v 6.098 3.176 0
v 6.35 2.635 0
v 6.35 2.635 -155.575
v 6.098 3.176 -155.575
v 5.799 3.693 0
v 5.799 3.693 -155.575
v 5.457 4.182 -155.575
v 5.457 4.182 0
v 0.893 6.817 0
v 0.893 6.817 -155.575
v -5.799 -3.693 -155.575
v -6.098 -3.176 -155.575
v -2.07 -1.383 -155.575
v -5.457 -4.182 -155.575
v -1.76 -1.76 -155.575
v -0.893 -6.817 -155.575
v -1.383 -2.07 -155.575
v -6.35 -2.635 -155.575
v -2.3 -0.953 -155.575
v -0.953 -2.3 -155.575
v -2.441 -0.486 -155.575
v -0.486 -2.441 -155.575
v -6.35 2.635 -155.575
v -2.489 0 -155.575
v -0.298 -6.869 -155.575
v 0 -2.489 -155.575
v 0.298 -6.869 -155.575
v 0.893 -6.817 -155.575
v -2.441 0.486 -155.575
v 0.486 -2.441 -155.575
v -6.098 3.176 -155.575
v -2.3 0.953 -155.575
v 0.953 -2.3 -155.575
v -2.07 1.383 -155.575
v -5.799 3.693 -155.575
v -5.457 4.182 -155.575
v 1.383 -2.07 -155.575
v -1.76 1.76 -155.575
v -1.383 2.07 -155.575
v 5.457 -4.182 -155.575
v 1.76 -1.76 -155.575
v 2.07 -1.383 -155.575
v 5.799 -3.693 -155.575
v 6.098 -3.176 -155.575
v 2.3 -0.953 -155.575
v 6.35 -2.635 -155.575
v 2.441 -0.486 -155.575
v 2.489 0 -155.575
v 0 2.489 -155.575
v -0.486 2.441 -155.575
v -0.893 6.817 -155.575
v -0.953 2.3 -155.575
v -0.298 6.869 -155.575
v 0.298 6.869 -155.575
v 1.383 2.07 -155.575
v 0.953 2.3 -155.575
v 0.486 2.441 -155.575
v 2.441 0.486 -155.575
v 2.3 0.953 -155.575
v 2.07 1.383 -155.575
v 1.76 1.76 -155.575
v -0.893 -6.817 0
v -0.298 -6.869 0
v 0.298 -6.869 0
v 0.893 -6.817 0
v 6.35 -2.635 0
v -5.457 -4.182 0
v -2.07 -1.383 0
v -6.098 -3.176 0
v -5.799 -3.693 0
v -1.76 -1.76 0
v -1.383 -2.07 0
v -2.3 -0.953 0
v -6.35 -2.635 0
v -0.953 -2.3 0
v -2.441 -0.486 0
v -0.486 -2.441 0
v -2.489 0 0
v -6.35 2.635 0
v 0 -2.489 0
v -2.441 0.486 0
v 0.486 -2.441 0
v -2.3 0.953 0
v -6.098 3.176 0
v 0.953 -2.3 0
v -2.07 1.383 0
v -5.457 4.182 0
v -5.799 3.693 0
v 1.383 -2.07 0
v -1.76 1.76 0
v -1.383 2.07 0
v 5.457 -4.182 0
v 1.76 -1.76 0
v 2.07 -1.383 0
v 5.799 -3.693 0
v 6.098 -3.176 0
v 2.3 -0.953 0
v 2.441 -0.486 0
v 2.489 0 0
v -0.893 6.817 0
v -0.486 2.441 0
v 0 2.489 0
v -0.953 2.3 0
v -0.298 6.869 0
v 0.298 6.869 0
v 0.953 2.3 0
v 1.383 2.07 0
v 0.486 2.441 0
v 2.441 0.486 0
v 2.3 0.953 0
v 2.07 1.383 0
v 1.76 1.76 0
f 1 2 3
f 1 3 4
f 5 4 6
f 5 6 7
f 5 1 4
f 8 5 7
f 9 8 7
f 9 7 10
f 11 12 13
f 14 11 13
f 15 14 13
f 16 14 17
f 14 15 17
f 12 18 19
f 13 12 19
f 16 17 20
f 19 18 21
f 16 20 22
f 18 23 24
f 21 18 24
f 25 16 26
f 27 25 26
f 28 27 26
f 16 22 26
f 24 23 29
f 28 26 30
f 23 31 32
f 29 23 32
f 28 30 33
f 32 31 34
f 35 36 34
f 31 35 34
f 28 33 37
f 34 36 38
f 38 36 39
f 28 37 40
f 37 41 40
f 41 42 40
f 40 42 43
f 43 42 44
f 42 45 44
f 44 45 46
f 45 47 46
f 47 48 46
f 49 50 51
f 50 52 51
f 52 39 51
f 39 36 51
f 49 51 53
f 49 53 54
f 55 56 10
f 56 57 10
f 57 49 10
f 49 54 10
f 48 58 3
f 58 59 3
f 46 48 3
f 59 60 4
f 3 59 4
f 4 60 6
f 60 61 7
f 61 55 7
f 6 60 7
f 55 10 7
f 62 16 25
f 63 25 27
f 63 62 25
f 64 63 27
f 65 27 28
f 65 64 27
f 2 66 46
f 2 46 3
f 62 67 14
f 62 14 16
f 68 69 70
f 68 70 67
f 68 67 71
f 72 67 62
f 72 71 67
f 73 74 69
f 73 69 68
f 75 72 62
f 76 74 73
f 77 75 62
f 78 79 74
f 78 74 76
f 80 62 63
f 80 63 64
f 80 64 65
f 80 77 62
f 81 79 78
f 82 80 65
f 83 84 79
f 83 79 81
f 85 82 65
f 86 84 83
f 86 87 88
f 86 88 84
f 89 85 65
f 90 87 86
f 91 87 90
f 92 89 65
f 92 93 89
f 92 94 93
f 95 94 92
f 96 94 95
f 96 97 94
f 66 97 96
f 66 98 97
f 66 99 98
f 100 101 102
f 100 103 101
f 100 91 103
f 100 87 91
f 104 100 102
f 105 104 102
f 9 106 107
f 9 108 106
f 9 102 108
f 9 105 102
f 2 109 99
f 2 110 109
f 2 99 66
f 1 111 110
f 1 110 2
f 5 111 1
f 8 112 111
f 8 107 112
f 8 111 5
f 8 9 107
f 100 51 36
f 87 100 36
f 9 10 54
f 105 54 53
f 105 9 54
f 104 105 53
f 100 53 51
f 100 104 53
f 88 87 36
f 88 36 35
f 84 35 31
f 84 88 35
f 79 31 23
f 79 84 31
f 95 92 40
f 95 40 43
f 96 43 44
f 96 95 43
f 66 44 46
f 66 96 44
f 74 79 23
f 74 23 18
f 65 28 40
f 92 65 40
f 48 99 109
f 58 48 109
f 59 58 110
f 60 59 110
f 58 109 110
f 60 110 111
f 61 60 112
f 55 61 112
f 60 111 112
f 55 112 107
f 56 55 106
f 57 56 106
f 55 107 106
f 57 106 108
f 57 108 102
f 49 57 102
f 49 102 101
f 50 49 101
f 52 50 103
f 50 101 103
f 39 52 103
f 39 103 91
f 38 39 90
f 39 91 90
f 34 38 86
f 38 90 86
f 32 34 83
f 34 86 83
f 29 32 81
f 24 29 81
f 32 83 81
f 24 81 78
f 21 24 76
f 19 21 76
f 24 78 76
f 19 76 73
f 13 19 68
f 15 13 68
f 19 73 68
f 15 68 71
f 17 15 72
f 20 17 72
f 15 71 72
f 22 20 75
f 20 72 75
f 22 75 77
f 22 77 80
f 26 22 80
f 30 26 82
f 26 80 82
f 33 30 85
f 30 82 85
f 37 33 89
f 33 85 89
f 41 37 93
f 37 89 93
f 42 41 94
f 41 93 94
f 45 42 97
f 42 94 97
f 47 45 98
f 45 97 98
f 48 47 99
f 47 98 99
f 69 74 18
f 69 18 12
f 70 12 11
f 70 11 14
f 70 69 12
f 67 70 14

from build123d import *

# Parameters (mm, degrees)
SKETCH2_R           = 2.4892
BOSS_EXTRUDE1_DEPTH = 155.575


with BuildPart() as part:
    # Sketch2 → Boss-Extrude1 (new body)
    with BuildSketch(Plane.XY):
        with BuildLine():
            Line((-0.893039494, 6.816751826), (-5.456960506, 4.181770802))
            ThreePointArc((-5.456960506, 4.181770802), (-5.953924651, 3.4375), (-6.35, 2.634981025))
            Line((-6.35, 2.634981025), (-6.35, -2.634981025))
            ThreePointArc((-6.35, -2.634981025), (-5.953924651, -3.4375), (-5.456960506, -4.181770802))
            Line((-5.456960506, -4.181770802), (-0.893039494, -6.816751826))
            ThreePointArc((-0.893039494, -6.816751826), (0, -6.875), (0.893039494, -6.816751826))
            Line((0.893039494, -6.816751826), (5.456960506, -4.181770802))
            ThreePointArc((5.456960506, -4.181770802), (5.953924651, -3.4375), (6.35, -2.634981025))
            Line((6.35, -2.634981025), (6.35, 2.634981025))
            ThreePointArc((6.35, 2.634981025), (5.953924651, 3.4375), (5.456960506, 4.181770802))
            Line((5.456960506, 4.181770802), (0.893039494, 6.816751826))
            ThreePointArc((0.893039494, 6.816751826), (0, 6.875), (-0.893039494, 6.816751826))
        make_face()
        Circle(SKETCH2_R, mode=Mode.SUBTRACT)
    extrude(amount=-BOSS_EXTRUDE1_DEPTH)


solid = part.part
